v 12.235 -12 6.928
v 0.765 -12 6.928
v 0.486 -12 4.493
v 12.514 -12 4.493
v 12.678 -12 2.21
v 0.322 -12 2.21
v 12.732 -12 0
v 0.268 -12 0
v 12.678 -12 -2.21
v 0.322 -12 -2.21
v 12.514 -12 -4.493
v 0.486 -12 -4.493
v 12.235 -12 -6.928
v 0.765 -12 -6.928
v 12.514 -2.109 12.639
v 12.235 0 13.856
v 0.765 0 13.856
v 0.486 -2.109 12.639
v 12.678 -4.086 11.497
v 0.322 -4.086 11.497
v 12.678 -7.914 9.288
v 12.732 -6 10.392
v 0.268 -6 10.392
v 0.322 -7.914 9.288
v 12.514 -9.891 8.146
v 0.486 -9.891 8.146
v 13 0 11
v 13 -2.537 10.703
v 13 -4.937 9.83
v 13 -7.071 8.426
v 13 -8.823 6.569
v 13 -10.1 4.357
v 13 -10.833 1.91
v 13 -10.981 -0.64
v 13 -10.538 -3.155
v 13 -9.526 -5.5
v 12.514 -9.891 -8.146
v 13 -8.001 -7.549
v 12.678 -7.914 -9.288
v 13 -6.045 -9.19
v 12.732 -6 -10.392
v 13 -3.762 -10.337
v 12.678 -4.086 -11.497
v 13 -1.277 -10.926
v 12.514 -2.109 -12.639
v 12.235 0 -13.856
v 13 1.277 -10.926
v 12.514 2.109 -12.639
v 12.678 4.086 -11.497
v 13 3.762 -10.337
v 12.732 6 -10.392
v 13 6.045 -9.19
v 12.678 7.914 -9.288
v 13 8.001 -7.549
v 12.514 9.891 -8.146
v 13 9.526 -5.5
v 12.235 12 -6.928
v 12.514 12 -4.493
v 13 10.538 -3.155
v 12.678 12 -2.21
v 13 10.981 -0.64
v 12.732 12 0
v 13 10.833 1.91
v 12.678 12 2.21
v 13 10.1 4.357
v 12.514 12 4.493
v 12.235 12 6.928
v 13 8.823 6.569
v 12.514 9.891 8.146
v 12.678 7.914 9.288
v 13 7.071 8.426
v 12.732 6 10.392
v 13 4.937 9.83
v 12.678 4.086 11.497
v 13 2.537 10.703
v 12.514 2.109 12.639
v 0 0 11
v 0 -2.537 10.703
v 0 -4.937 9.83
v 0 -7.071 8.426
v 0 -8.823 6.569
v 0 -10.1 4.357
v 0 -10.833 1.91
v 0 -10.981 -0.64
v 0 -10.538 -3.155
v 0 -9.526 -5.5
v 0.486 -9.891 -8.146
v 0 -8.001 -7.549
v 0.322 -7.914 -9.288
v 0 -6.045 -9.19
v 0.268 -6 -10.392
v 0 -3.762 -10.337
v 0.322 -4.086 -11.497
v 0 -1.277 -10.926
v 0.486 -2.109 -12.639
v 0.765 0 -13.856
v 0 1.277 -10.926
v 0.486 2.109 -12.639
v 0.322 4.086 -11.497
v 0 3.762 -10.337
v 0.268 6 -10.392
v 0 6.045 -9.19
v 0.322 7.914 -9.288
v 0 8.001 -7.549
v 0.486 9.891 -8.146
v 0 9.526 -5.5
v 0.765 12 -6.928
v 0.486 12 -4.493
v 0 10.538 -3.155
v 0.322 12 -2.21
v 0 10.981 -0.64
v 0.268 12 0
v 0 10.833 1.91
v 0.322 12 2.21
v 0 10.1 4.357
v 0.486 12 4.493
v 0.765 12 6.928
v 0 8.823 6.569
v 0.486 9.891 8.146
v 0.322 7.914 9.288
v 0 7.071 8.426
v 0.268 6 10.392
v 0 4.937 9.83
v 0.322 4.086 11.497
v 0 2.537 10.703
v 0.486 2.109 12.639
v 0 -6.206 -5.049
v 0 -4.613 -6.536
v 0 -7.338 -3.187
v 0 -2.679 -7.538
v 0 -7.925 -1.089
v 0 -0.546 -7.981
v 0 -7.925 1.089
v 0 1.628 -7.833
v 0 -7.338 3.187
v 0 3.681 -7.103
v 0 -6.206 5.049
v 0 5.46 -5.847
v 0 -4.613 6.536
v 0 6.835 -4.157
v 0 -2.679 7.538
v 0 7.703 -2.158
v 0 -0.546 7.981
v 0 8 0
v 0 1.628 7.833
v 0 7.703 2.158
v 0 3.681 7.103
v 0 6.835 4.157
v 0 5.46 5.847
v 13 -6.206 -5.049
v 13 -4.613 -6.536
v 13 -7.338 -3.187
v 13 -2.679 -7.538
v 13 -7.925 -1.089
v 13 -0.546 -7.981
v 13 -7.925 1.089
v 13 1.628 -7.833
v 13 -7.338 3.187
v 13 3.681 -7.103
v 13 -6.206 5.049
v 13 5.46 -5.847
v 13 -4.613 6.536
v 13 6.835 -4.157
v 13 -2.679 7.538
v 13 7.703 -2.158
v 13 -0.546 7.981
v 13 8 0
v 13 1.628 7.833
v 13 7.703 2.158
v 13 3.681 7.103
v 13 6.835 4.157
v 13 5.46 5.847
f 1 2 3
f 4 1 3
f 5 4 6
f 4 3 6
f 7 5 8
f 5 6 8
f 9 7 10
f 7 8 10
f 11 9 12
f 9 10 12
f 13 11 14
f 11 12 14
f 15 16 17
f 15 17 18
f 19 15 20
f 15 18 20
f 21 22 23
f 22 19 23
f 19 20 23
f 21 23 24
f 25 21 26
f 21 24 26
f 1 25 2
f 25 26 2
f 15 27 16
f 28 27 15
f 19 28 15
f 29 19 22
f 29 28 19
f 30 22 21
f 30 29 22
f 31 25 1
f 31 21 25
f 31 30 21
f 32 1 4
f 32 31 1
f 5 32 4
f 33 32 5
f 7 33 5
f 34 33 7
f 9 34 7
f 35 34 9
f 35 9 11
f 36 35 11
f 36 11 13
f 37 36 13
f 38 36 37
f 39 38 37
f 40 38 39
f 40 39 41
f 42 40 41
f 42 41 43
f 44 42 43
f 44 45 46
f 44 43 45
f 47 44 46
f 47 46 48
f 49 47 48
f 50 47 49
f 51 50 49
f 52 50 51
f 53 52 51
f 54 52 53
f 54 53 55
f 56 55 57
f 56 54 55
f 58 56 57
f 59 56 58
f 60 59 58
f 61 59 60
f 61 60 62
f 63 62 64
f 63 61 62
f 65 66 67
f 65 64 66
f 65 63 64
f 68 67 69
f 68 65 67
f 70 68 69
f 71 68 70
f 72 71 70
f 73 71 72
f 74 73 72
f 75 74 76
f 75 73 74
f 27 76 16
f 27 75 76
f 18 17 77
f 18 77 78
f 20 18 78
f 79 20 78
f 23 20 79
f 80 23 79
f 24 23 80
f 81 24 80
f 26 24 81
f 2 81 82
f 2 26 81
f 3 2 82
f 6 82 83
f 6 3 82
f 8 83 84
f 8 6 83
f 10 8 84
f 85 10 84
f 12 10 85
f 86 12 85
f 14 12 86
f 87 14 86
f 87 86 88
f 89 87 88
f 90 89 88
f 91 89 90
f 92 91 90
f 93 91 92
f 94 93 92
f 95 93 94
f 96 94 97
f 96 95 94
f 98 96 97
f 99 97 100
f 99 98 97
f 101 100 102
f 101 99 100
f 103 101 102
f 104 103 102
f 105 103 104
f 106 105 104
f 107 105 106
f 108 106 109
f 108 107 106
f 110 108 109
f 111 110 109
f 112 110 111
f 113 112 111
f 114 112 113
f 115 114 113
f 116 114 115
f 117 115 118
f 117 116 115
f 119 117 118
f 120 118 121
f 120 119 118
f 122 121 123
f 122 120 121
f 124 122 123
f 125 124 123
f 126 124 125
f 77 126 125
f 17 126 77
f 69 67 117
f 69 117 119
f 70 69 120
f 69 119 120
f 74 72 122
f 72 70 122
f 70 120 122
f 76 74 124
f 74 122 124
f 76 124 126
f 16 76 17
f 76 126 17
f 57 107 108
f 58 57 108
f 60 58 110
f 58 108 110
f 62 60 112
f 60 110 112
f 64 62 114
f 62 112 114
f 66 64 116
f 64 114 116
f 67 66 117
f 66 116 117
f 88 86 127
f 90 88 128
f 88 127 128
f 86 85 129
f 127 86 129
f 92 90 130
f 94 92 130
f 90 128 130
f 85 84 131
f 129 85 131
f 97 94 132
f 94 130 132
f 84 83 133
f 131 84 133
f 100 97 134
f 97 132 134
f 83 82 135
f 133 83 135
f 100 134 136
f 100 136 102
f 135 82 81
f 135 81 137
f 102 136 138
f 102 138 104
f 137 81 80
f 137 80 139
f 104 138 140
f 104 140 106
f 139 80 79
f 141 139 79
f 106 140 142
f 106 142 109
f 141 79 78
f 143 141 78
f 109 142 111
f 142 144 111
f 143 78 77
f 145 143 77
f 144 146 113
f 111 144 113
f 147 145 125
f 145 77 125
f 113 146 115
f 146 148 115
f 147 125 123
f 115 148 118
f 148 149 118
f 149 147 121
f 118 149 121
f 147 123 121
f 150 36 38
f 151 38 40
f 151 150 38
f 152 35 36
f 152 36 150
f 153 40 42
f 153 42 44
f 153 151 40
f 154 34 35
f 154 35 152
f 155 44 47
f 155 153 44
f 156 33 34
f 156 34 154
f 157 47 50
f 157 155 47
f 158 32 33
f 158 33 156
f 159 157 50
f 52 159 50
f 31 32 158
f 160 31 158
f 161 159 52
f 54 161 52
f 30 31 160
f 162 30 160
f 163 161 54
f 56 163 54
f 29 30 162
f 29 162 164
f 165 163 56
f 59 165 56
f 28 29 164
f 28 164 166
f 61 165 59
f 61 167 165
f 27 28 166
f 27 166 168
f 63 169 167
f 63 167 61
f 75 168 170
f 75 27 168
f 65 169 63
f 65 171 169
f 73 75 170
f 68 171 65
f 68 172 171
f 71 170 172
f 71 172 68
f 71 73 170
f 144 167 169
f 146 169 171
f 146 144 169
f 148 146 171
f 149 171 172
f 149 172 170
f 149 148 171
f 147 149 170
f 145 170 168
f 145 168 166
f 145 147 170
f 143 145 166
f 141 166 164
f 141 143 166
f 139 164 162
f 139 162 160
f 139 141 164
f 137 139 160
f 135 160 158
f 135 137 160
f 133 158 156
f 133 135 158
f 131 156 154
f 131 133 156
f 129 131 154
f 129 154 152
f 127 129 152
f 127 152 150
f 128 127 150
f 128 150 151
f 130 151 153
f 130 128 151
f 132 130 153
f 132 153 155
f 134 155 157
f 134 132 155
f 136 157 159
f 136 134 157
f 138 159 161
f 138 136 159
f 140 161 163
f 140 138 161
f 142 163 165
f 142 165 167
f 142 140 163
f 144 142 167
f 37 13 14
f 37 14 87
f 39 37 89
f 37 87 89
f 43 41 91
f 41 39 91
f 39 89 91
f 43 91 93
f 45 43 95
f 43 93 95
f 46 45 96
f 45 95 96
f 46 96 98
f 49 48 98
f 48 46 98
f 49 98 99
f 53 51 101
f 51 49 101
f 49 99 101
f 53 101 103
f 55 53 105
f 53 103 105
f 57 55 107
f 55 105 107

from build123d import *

# Parameters (mm, degrees)
F0_R     = 8
F1_DEPTH = 13


with BuildPart() as f1:
    # F0 (on Right) → F1 (new body)
    with BuildSketch(Plane.YZ):
        Polygon((12, 6.928203), (0, 13.856406), (-12, 6.928203), (-12, -6.928203), (0, -13.856406), (12, -6.928203), align=None)
        Circle(F0_R, mode=Mode.SUBTRACT)
    extrude(amount=F1_DEPTH)

    # F2 (on Front) → F3 (revolve, cut)
    with BuildSketch(Plane.XZ):
        Polygon((0, 24.532327), (0, 11), (3.625976, 24.532327), align=None)
        Polygon((9.374024, 24.532327), (13, 11), (13, 24.532327), align=None)
    revolve(axis=Axis((40.371262, 0, 0), (1, 0, 0)), mode=Mode.SUBTRACT)


solid = f1.part
